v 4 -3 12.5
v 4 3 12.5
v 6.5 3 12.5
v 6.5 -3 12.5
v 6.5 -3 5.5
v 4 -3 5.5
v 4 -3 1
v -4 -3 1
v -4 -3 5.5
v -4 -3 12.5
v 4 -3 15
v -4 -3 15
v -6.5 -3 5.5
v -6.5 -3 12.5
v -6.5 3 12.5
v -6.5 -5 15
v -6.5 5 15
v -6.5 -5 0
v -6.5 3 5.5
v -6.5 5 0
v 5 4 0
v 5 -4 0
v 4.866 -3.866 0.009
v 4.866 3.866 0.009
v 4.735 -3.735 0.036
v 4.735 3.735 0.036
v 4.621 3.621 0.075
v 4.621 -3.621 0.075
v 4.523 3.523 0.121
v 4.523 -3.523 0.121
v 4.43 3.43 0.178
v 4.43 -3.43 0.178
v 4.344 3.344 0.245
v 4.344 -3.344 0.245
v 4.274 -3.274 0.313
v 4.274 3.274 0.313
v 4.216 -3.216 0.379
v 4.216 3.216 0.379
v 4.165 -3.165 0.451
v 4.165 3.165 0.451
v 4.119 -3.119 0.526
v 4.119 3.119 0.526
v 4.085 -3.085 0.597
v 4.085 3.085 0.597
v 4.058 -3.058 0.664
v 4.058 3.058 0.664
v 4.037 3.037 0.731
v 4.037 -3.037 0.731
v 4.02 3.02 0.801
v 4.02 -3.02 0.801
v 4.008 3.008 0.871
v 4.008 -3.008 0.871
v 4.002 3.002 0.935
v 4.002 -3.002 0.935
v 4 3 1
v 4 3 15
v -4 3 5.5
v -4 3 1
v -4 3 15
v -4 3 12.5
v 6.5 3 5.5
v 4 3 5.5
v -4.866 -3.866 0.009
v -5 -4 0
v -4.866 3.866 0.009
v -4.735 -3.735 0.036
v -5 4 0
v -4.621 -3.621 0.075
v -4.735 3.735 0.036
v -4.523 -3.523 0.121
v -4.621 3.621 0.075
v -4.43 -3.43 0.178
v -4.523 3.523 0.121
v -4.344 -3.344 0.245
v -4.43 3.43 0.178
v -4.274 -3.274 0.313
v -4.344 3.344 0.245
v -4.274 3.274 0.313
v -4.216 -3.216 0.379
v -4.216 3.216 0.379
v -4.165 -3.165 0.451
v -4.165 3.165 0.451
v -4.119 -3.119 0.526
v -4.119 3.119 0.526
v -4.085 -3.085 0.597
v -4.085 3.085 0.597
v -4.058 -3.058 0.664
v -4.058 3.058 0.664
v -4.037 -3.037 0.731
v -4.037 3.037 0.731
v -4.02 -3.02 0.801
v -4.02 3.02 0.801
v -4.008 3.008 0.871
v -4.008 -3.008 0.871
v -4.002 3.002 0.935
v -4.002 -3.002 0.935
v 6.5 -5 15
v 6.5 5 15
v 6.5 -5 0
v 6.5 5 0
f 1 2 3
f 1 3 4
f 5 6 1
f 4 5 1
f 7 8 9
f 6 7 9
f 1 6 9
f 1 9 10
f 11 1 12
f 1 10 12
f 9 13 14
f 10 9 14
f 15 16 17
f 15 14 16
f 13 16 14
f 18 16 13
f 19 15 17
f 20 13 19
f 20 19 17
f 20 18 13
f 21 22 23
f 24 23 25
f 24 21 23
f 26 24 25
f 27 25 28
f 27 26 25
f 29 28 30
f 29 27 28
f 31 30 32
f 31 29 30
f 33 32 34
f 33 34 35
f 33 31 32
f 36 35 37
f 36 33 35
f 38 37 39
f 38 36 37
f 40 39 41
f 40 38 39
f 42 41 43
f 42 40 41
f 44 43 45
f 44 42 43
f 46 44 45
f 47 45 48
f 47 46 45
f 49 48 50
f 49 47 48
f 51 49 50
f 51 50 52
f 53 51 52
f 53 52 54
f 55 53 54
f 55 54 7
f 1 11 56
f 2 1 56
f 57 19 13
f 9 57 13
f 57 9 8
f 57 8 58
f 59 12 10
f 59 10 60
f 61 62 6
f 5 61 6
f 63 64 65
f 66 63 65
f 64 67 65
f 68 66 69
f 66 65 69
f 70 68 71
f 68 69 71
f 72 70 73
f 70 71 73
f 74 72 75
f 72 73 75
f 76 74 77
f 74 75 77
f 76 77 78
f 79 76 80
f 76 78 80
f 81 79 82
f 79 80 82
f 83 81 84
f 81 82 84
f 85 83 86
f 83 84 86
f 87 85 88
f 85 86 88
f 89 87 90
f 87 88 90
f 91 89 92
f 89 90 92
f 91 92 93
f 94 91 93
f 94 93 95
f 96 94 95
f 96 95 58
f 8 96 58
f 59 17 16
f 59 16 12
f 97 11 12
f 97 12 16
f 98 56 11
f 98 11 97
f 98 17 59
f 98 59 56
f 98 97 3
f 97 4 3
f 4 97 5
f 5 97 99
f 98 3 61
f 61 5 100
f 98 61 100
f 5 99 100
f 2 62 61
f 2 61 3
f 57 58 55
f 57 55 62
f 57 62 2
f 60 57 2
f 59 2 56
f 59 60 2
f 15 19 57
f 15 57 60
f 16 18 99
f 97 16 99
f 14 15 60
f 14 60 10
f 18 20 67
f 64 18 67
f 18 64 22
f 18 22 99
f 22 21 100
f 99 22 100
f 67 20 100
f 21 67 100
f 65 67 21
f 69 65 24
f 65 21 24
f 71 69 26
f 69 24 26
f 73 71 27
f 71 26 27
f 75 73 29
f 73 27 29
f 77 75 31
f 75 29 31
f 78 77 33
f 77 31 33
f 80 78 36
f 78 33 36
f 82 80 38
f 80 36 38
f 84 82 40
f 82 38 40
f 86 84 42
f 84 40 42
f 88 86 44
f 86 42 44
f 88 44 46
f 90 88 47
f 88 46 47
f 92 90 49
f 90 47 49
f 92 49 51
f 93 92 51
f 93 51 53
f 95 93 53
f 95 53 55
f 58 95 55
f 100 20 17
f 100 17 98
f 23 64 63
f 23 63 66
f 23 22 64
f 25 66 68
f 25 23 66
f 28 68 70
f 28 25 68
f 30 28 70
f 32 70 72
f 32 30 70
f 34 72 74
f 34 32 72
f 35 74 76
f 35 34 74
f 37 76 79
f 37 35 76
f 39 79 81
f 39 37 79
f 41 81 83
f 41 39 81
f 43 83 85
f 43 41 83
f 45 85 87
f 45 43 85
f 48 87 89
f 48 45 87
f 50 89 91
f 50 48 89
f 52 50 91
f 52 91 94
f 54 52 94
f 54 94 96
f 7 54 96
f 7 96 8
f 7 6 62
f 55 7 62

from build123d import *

# Parameters (mm, degrees)
F0_W     = 13
F0_H     = 10
F1_DEPTH = 15
F2_W     = 8
F2_H     = 6
F3_DEPTH = 25
F4_W     = 6
F4_H     = 7
F5_DEPTH = 13
F6_R     = 1


with BuildPart() as f1:
    # F0 (on Top) → F1 (new body)
    with BuildSketch(Plane.XY):
        Rectangle(F0_W, F0_H)
    extrude(amount=F1_DEPTH)

    # F2 (on face) → F3 (cut)
    with BuildSketch(Plane.XY.offset(15)):
        Rectangle(F2_W, F2_H)
    extrude(amount=-F3_DEPTH, mode=Mode.SUBTRACT)

    # F4 (on face) → F5 (cut)
    with BuildSketch(Plane(origin=(-6.5, 0, 0), x_dir=(0, -1, 0), z_dir=(-1, 0, 0))):
        with Locations((0, 9)):
            Rectangle(F4_W, F4_H)
    extrude(amount=-F5_DEPTH, mode=Mode.SUBTRACT)

    # F6
    f6_edges = [f1.edges().sort_by_distance(p)[0] for p in [
        (4, 0, 0),
        (0, 3, 0),
        (-4, 0, 0),
        (0, -3, 0),
    ]]
    fillet(f6_edges, radius=F6_R)


solid = f1.part
